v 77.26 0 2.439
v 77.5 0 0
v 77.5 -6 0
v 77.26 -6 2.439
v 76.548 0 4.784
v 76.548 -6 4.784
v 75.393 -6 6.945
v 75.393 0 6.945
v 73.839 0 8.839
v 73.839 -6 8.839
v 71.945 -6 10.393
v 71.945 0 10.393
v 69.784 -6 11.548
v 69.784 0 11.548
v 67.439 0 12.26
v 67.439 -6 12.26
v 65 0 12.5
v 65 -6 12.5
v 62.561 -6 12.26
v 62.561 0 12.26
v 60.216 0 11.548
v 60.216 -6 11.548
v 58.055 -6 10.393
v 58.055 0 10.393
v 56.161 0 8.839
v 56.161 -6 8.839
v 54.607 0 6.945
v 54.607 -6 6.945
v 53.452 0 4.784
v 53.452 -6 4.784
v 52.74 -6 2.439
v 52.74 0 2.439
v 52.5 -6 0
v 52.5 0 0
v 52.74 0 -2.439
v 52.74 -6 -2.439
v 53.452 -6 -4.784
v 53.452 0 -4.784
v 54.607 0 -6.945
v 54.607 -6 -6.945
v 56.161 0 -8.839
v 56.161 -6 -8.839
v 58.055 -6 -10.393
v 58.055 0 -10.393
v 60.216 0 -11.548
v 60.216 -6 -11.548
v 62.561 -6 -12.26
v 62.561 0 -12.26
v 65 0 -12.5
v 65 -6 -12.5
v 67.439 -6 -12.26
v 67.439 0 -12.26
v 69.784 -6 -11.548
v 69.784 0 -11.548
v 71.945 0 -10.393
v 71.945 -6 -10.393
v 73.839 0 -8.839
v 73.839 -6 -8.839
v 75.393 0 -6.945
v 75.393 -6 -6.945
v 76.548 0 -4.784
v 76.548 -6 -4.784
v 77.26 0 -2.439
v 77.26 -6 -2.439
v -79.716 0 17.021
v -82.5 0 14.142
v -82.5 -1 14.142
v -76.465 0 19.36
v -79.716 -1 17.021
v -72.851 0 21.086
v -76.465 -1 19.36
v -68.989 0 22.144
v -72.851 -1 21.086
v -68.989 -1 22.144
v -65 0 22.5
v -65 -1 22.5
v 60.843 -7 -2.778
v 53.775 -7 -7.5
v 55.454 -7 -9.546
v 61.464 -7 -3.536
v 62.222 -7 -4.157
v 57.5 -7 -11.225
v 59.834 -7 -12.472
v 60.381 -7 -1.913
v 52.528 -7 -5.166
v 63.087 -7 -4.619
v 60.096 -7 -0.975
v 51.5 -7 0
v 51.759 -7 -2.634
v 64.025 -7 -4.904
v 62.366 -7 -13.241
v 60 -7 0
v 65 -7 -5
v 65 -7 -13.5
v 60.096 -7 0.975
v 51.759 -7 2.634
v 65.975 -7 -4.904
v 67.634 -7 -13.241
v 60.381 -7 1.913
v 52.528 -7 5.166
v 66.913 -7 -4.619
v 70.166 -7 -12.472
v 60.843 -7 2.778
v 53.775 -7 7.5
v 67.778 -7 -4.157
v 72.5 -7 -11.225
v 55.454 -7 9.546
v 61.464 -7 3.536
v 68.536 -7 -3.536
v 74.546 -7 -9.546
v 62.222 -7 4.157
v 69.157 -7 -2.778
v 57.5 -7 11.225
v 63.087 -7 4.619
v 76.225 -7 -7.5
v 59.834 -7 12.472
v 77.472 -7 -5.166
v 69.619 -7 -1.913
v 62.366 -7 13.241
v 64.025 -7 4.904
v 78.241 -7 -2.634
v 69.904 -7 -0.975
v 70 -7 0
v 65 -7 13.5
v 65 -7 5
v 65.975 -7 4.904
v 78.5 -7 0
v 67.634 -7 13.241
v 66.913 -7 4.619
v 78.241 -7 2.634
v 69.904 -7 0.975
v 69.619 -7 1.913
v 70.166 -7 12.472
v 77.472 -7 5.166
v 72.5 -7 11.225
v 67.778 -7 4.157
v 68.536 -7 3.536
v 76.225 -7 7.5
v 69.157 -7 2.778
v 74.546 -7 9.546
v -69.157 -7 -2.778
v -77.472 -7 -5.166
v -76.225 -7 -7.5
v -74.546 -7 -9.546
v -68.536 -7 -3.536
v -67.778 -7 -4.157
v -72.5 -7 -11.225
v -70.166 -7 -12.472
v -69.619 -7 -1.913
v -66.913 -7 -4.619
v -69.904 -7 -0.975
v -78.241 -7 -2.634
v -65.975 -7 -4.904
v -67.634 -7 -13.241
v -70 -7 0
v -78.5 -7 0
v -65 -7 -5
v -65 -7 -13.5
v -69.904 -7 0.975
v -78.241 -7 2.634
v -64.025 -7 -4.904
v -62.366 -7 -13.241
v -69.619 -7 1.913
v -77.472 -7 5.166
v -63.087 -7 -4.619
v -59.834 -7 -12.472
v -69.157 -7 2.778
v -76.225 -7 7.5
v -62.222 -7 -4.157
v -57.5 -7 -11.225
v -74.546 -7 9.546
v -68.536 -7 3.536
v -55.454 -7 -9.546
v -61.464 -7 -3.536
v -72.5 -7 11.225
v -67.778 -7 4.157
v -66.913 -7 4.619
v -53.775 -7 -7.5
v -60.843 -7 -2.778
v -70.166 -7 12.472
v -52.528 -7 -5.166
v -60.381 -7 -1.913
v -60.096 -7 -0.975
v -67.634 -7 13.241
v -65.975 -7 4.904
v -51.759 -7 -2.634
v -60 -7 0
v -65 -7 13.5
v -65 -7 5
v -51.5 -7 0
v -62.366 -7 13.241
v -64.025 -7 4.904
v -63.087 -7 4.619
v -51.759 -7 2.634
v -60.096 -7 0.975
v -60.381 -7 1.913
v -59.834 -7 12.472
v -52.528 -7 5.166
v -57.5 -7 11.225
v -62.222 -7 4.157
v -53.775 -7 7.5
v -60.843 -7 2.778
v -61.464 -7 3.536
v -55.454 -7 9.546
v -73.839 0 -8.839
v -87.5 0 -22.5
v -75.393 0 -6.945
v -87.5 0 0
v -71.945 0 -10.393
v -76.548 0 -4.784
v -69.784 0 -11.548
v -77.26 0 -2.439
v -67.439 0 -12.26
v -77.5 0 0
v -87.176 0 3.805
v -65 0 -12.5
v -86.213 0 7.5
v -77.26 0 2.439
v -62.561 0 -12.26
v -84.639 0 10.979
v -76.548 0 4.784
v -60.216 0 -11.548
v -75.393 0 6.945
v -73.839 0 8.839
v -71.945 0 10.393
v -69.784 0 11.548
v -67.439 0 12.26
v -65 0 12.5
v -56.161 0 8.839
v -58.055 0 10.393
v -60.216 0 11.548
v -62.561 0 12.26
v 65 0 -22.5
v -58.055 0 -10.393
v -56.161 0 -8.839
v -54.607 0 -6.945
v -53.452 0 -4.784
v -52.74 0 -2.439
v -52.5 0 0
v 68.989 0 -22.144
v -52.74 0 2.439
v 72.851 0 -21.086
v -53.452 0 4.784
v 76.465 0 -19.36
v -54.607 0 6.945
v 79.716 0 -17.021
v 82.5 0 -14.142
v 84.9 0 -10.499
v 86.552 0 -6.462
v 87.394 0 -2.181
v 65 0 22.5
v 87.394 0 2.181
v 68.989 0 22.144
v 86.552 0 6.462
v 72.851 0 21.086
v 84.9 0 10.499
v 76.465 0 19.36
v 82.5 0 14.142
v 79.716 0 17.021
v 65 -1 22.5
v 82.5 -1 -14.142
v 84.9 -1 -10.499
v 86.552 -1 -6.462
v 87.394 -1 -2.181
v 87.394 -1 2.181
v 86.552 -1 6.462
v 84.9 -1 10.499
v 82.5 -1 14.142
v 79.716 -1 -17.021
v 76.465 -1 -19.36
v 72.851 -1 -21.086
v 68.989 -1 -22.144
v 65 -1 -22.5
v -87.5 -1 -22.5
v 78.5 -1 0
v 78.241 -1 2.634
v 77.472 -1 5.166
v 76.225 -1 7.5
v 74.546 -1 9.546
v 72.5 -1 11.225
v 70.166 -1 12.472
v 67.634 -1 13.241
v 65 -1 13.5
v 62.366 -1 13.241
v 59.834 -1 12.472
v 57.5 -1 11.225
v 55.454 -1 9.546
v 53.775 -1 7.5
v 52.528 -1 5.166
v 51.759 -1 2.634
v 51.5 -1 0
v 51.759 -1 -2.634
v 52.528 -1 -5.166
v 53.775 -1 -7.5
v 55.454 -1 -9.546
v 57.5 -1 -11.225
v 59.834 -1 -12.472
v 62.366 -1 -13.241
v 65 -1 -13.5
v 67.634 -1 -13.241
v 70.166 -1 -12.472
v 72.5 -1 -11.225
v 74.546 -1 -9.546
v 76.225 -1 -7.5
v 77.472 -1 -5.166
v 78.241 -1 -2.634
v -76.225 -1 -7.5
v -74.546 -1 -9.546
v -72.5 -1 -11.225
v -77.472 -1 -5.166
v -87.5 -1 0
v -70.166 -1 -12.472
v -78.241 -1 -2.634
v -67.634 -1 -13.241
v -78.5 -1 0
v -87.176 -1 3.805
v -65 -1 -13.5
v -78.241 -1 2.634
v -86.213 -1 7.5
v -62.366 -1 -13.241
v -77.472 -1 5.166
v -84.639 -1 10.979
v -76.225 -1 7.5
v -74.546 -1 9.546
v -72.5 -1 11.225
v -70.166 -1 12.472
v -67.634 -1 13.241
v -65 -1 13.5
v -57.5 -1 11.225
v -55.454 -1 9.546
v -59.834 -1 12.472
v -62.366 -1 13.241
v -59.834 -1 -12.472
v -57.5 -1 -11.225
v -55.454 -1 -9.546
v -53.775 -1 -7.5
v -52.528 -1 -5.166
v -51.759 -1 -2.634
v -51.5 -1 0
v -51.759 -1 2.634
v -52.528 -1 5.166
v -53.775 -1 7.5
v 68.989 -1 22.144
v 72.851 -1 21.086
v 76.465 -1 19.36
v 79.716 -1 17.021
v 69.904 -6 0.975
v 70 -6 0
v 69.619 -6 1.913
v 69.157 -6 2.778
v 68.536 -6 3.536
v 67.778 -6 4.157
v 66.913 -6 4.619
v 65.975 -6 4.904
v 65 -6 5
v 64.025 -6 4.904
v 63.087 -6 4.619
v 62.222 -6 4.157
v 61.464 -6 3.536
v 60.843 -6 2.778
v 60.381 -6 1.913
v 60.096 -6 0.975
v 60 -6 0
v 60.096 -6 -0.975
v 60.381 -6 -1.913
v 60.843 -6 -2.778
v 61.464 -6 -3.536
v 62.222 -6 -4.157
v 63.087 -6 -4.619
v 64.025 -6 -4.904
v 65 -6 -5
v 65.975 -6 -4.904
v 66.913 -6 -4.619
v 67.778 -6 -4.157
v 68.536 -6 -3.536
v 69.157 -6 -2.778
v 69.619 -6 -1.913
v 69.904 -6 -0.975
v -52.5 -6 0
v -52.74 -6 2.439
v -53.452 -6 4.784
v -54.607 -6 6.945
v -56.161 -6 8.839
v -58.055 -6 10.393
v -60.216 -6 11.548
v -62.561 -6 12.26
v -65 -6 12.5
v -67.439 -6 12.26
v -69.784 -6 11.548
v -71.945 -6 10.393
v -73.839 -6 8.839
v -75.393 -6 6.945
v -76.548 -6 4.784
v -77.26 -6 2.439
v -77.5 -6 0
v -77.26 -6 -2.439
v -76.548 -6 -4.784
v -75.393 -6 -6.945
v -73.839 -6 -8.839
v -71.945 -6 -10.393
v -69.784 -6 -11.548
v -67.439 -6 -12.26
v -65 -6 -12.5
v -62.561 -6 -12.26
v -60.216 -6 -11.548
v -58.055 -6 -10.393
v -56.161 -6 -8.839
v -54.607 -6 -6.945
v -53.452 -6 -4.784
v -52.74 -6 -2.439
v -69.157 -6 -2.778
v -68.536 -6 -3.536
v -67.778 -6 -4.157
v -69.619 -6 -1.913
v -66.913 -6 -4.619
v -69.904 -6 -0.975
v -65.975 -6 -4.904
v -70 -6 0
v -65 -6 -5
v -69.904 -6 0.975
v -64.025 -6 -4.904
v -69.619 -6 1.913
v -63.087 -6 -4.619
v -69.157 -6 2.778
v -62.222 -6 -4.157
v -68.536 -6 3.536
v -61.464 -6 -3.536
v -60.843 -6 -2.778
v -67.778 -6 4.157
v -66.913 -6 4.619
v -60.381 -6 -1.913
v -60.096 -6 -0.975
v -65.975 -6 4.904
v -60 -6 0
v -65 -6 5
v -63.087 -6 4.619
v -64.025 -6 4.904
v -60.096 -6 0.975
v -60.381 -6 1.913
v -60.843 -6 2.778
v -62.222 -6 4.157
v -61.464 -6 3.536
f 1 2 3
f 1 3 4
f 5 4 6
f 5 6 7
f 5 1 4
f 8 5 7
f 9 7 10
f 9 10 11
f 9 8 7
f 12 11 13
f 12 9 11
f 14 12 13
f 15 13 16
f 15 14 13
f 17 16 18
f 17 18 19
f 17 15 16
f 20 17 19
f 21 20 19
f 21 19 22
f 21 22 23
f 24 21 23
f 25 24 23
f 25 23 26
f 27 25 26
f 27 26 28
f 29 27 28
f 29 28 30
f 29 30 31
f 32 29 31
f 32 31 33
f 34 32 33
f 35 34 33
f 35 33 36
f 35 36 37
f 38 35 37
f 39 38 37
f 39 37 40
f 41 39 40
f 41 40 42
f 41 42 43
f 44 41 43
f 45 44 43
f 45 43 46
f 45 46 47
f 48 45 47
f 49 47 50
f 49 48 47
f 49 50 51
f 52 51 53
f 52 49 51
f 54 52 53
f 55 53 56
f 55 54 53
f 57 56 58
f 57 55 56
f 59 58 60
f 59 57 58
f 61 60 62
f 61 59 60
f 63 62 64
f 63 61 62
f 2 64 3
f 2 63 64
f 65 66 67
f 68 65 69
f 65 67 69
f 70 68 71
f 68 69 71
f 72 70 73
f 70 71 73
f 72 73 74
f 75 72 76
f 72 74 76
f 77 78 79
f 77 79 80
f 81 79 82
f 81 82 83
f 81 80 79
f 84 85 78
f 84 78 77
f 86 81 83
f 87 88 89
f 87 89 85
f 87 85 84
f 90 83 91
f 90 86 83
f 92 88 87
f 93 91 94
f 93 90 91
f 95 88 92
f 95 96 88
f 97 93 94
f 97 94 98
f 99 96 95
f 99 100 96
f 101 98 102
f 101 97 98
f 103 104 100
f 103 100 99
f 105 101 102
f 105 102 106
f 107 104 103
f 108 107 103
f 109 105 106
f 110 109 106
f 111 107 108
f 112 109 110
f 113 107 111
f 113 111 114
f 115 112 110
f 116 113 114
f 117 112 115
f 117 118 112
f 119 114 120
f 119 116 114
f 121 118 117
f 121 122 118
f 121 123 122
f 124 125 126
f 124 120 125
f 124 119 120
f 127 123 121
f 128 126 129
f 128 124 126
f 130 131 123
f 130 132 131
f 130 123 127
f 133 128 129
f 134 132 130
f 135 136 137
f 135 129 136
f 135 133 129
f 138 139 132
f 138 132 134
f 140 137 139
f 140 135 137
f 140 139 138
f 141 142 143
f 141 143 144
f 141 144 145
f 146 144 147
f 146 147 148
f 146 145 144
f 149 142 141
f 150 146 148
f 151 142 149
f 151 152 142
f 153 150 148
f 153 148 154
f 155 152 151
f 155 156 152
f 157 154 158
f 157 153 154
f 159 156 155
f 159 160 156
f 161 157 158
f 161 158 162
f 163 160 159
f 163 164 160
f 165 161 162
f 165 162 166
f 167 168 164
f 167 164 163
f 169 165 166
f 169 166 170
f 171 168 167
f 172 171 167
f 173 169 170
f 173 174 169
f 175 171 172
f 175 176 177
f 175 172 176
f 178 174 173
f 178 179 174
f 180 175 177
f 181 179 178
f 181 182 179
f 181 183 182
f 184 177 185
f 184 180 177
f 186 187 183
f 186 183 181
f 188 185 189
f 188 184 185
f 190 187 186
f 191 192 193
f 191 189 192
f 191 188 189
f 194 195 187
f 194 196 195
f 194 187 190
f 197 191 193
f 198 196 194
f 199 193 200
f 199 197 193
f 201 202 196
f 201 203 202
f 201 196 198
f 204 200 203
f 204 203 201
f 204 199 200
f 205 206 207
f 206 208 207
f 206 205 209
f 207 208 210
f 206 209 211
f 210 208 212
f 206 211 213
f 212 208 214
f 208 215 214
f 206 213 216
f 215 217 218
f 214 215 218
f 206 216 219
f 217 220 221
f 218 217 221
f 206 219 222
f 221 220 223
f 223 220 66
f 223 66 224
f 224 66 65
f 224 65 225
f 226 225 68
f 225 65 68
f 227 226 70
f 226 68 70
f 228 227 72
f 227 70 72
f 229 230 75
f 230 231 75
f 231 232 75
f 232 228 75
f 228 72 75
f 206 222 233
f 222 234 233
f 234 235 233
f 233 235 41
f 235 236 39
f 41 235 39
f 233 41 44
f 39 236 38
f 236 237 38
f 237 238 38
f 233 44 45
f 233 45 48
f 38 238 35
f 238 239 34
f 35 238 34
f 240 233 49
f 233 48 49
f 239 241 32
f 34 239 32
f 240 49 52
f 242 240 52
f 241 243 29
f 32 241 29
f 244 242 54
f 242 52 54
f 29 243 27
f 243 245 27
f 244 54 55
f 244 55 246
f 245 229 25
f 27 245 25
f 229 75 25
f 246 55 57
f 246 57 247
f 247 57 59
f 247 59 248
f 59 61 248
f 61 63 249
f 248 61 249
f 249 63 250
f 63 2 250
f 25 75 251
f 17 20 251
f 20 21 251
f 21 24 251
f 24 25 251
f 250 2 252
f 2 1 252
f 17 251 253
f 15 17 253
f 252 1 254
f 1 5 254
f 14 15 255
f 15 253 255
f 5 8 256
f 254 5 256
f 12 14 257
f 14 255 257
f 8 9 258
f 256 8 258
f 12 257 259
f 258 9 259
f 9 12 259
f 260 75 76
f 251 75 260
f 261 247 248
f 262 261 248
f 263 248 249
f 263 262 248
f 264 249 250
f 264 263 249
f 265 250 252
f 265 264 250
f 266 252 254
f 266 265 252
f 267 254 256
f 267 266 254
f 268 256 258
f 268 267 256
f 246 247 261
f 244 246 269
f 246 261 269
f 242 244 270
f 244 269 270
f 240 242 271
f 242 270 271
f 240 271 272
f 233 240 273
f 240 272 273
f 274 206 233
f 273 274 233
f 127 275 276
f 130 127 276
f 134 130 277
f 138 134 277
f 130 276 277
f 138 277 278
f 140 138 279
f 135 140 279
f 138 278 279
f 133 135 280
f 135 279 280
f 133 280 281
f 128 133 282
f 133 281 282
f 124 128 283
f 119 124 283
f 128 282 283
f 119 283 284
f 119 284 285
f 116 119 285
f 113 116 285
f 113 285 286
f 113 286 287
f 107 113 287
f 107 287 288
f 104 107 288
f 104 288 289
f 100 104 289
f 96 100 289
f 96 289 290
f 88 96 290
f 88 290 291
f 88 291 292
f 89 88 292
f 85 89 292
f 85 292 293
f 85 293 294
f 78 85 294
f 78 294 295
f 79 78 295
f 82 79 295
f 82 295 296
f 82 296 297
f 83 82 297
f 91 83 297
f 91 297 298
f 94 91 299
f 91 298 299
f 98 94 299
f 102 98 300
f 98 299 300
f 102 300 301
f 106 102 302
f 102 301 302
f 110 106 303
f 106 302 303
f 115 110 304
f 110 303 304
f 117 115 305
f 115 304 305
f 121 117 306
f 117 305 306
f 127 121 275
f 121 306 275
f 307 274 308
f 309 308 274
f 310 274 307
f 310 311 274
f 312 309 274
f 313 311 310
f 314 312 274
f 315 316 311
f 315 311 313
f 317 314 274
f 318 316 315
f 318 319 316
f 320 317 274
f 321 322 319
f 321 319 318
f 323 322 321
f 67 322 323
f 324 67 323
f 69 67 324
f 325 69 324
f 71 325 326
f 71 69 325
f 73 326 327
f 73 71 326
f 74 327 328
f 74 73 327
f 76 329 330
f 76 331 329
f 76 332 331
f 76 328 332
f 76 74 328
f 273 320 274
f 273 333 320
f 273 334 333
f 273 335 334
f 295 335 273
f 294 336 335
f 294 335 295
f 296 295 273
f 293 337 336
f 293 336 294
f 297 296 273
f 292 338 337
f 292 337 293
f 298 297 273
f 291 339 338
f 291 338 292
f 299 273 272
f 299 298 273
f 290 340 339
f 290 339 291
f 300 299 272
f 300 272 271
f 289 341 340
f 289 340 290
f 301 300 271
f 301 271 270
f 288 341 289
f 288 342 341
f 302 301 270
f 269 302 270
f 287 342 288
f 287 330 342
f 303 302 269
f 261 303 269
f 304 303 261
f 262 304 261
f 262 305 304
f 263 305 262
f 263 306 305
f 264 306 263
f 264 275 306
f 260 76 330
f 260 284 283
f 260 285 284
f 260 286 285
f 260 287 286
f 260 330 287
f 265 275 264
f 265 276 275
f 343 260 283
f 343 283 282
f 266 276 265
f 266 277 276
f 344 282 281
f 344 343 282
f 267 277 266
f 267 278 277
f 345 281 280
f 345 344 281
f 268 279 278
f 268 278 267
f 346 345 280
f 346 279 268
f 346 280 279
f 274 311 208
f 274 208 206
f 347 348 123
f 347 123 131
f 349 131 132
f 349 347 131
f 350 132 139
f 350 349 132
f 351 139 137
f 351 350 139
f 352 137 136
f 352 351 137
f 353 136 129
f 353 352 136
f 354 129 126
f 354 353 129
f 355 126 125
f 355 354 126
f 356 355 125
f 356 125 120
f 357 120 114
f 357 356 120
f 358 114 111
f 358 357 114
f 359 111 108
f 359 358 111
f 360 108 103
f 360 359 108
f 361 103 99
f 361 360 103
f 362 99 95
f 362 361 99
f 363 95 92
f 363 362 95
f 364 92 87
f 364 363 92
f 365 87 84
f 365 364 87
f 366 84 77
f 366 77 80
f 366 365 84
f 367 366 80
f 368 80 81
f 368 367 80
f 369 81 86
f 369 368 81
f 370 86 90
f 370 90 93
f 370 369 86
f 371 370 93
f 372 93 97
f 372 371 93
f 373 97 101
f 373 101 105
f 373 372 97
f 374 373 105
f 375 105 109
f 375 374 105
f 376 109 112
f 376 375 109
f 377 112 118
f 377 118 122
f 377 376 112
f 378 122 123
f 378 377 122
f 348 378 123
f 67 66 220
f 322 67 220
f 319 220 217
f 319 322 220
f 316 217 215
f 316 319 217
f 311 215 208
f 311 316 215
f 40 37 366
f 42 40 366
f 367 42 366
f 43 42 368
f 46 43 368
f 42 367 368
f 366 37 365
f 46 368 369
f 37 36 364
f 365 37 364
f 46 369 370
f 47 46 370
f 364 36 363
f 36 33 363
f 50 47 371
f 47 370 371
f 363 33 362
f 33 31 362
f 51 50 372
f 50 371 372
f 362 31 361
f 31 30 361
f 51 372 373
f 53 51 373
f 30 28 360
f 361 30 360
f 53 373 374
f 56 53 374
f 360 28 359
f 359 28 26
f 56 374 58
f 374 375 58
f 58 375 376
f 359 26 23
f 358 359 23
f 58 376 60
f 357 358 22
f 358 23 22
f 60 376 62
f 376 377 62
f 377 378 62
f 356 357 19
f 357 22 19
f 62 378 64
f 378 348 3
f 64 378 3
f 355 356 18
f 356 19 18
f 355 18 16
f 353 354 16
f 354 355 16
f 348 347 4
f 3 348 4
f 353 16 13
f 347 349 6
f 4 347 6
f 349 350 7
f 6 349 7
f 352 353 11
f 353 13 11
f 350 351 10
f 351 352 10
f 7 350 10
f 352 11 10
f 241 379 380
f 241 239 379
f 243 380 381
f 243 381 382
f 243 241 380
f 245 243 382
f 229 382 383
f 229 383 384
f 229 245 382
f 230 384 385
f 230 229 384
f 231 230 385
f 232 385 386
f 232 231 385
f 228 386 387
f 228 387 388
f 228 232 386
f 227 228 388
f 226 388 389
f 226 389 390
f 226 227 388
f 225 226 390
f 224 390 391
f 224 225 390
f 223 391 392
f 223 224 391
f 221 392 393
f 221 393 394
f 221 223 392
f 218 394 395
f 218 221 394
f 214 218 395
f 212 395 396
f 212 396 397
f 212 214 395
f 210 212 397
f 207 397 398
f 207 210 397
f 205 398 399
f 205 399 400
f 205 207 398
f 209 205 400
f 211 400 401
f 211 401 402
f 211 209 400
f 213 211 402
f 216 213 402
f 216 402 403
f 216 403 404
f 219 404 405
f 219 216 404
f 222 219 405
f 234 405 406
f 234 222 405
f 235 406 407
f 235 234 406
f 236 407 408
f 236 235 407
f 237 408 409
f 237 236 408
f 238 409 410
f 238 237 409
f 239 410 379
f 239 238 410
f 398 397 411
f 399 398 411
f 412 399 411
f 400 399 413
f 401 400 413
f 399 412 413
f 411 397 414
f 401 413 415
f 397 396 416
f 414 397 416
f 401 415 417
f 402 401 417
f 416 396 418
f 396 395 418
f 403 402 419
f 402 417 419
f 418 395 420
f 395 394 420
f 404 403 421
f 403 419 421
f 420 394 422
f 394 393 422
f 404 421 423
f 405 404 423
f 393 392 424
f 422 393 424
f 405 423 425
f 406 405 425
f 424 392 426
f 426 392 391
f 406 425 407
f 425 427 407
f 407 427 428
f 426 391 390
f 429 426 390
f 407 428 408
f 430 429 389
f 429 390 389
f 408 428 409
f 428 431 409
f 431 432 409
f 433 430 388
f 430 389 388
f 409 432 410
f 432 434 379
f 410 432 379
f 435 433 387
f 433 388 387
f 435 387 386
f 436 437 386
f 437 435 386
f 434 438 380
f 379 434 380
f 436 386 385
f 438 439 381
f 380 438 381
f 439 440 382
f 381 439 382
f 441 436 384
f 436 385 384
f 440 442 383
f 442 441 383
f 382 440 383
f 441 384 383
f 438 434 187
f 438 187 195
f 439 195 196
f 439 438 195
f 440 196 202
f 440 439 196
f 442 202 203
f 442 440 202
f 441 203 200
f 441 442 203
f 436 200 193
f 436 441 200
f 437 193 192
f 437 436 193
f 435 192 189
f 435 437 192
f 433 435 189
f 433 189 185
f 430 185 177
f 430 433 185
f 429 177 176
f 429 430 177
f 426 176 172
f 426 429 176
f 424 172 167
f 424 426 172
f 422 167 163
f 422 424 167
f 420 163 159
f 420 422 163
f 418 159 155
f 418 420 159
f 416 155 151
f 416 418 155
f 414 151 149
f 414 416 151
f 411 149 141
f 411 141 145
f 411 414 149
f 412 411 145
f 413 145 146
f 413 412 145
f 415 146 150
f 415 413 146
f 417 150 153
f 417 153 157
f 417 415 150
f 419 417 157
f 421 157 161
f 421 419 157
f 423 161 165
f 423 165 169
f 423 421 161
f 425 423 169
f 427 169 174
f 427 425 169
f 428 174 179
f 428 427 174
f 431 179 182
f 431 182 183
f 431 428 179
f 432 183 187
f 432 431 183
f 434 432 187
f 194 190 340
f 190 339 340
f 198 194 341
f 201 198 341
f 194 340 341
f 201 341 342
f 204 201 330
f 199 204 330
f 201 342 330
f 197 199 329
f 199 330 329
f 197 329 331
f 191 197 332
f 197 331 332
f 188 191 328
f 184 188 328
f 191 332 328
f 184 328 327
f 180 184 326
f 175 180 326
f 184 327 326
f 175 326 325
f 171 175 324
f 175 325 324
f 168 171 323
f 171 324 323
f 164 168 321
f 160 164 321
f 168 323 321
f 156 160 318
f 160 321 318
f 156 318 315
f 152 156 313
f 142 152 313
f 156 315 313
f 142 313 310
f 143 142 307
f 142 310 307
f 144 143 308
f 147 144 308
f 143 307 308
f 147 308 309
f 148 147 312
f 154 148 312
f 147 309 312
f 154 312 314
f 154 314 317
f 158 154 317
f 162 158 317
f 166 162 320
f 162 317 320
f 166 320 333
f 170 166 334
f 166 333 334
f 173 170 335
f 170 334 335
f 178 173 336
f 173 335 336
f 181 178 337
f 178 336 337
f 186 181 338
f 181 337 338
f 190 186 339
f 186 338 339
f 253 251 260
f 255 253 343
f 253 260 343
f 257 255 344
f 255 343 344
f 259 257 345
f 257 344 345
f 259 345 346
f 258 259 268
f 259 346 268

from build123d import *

# Parameters (mm, degrees)
F0_W      = 165
F0_H      = 45
F0_R      = 12.5
F1_DEPTH  = 1
F3_DEPTH  = 1
F4_DEPTH  = 25
F5_DEPTH  = 25
F6_R      = 13.5
F6_R_2    = 12.5
F7_DEPTH  = 5
F8_R      = 13.5
F8_R_2    = 5
F9_DEPTH  = 1
F11_DEPTH = 1


with BuildPart() as f1:
    # F0 (on Front) → F1 (new body)
    with BuildSketch(Plane.XZ):
        Rectangle(F0_W, F0_H)
        with Locations((-65, 0)):
            Circle(F0_R, mode=Mode.SUBTRACT)
        with Locations((65, 0)):
            Circle(F0_R, mode=Mode.SUBTRACT)
    extrude(amount=F1_DEPTH)

    # F2 (on face) → F3 (join)
    with BuildSketch(Plane.XZ.offset(1)):
        with BuildLine():
            Line((68.3925151825, -19.0988145769), (65, -22.5))
            ThreePointArc((65, -22.5), (87.5, 0), (65, 22.5))
            Line((65, 22.5), (71.474224329, 16.2770561874))
            Line((71.474224329, 16.2770561874), (77.4062722921, 9.1145541519))
            Line((77.4062722921, 9.1145541519), (80.3926512599, 2.1407562308))
            Line((80.3926512599, 2.1407562308), (80.3926512599, -5.2317115478))
            Line((80.3926512599, -5.2317115478), (78.3914923668, -12.1520543471))
            Line((78.3914923668, -12.1520543471), (74.6632069349, -14.4081749022))
            Line((74.6632069349, -14.4081749022), (68.3925151825, -19.0988145769))
        make_face()
        with BuildLine():
            Line((-65, 14.9617949501), (-65, 22.5))
            ThreePointArc((-65, 22.5), (-87.5, 0), (-65, -22.5))
            Line((-65, -22.5), (-67.4760043621, -15.6979020685))
            Line((-67.4760043621, -15.6979020685), (-72.8440880775, -12.9142012447))
            Line((-72.8440880775, -12.9142012447), (-76.5851810575, -7.8018400818))
            Line((-76.5851810575, -7.8018400818), (-79.5639529824, 0))
            Line((-79.5639529824, 0), (-79.5639529824, 6.4657721668))
            Line((-79.5639529824, 6.4657721668), (-75.4495188594, 11.7608513683))
            Line((-75.4495188594, 11.7608513683), (-65, 14.9617949501))
        make_face()
    extrude(amount=-F3_DEPTH)

    # F2 (on face) → F4 (cut)
    with BuildSketch(Plane.XZ.offset(1)):
        with BuildLine():
            Line((-82.5, 22.5), (-82.5, 14.1421356237))
            ThreePointArc((-82.5, 14.1421356237), (-74.6966991411, 20.3033008589), (-65, 22.5))
            Line((-65, 22.5), (-82.5, 22.5))
        make_face()
    extrude(amount=-F4_DEPTH, mode=Mode.SUBTRACT)

    # F2 (on face) → F5 (cut)
    with BuildSketch(Plane.XZ.offset(1)):
        with BuildLine():
            ThreePointArc((82.5, -14.1421356237), (74.6966991411, -20.3033008589), (65, -22.5))
            Line((65, -22.5), (82.5, -22.5))
            Line((82.5, -22.5), (82.5, -14.1421356237))
        make_face()
        with BuildLine():
            ThreePointArc((65, 22.5), (74.6966991411, 20.3033008589), (82.5, 14.1421356237))
            Line((82.5, 14.1421356237), (82.5, 22.5))
            Line((82.5, 22.5), (65, 22.5))
        make_face()
        with BuildLine():
            Line((-82.5, -22.5), (-65, -22.5))
            ThreePointArc((-65, -22.5), (-74.6966991411, -20.3033008589), (-82.5, -14.1421356237))
            Line((-82.5, -14.1421356237), (-82.5, -22.5))
        make_face()
    extrude(amount=-F5_DEPTH, mode=Mode.SUBTRACT)

    # F6 (on face) → F7 (join)
    with BuildSketch(Plane.XZ.offset(1)):
        with Locations((-65, 0)):
            Circle(F6_R)
        with Locations((-65, 0)):
            Circle(F6_R_2, mode=Mode.SUBTRACT)
        with Locations((65, 0)):
            Circle(F6_R)
        with Locations((65, 0)):
            Circle(F6_R_2, mode=Mode.SUBTRACT)
    extrude(amount=F7_DEPTH)

    # F8 (on face) → F9 (join)
    with BuildSketch(Plane.XZ.offset(6)):
        with Locations((-65, 0)):
            Circle(F8_R)
        with Locations((-65, 0)):
            Circle(F8_R_2, mode=Mode.SUBTRACT)
        with Locations((65, 0)):
            Circle(F8_R)
        with Locations((65, 0)):
            Circle(F8_R_2, mode=Mode.SUBTRACT)
    extrude(amount=F9_DEPTH)

    # F10 (on face) → F11 (join)
    with BuildSketch(Plane.XZ.offset(1)):
        Polygon((-81.9395110011, 0), (-87.5, 0), (-87.5, -22.5), (-65, -22.5), (-65, -18.5897927731), (-73.3228996396, -16.0001199692), (-80.1934376359, -9.6208481118), align=None)
    extrude(amount=-F11_DEPTH)


solid = f1.part
